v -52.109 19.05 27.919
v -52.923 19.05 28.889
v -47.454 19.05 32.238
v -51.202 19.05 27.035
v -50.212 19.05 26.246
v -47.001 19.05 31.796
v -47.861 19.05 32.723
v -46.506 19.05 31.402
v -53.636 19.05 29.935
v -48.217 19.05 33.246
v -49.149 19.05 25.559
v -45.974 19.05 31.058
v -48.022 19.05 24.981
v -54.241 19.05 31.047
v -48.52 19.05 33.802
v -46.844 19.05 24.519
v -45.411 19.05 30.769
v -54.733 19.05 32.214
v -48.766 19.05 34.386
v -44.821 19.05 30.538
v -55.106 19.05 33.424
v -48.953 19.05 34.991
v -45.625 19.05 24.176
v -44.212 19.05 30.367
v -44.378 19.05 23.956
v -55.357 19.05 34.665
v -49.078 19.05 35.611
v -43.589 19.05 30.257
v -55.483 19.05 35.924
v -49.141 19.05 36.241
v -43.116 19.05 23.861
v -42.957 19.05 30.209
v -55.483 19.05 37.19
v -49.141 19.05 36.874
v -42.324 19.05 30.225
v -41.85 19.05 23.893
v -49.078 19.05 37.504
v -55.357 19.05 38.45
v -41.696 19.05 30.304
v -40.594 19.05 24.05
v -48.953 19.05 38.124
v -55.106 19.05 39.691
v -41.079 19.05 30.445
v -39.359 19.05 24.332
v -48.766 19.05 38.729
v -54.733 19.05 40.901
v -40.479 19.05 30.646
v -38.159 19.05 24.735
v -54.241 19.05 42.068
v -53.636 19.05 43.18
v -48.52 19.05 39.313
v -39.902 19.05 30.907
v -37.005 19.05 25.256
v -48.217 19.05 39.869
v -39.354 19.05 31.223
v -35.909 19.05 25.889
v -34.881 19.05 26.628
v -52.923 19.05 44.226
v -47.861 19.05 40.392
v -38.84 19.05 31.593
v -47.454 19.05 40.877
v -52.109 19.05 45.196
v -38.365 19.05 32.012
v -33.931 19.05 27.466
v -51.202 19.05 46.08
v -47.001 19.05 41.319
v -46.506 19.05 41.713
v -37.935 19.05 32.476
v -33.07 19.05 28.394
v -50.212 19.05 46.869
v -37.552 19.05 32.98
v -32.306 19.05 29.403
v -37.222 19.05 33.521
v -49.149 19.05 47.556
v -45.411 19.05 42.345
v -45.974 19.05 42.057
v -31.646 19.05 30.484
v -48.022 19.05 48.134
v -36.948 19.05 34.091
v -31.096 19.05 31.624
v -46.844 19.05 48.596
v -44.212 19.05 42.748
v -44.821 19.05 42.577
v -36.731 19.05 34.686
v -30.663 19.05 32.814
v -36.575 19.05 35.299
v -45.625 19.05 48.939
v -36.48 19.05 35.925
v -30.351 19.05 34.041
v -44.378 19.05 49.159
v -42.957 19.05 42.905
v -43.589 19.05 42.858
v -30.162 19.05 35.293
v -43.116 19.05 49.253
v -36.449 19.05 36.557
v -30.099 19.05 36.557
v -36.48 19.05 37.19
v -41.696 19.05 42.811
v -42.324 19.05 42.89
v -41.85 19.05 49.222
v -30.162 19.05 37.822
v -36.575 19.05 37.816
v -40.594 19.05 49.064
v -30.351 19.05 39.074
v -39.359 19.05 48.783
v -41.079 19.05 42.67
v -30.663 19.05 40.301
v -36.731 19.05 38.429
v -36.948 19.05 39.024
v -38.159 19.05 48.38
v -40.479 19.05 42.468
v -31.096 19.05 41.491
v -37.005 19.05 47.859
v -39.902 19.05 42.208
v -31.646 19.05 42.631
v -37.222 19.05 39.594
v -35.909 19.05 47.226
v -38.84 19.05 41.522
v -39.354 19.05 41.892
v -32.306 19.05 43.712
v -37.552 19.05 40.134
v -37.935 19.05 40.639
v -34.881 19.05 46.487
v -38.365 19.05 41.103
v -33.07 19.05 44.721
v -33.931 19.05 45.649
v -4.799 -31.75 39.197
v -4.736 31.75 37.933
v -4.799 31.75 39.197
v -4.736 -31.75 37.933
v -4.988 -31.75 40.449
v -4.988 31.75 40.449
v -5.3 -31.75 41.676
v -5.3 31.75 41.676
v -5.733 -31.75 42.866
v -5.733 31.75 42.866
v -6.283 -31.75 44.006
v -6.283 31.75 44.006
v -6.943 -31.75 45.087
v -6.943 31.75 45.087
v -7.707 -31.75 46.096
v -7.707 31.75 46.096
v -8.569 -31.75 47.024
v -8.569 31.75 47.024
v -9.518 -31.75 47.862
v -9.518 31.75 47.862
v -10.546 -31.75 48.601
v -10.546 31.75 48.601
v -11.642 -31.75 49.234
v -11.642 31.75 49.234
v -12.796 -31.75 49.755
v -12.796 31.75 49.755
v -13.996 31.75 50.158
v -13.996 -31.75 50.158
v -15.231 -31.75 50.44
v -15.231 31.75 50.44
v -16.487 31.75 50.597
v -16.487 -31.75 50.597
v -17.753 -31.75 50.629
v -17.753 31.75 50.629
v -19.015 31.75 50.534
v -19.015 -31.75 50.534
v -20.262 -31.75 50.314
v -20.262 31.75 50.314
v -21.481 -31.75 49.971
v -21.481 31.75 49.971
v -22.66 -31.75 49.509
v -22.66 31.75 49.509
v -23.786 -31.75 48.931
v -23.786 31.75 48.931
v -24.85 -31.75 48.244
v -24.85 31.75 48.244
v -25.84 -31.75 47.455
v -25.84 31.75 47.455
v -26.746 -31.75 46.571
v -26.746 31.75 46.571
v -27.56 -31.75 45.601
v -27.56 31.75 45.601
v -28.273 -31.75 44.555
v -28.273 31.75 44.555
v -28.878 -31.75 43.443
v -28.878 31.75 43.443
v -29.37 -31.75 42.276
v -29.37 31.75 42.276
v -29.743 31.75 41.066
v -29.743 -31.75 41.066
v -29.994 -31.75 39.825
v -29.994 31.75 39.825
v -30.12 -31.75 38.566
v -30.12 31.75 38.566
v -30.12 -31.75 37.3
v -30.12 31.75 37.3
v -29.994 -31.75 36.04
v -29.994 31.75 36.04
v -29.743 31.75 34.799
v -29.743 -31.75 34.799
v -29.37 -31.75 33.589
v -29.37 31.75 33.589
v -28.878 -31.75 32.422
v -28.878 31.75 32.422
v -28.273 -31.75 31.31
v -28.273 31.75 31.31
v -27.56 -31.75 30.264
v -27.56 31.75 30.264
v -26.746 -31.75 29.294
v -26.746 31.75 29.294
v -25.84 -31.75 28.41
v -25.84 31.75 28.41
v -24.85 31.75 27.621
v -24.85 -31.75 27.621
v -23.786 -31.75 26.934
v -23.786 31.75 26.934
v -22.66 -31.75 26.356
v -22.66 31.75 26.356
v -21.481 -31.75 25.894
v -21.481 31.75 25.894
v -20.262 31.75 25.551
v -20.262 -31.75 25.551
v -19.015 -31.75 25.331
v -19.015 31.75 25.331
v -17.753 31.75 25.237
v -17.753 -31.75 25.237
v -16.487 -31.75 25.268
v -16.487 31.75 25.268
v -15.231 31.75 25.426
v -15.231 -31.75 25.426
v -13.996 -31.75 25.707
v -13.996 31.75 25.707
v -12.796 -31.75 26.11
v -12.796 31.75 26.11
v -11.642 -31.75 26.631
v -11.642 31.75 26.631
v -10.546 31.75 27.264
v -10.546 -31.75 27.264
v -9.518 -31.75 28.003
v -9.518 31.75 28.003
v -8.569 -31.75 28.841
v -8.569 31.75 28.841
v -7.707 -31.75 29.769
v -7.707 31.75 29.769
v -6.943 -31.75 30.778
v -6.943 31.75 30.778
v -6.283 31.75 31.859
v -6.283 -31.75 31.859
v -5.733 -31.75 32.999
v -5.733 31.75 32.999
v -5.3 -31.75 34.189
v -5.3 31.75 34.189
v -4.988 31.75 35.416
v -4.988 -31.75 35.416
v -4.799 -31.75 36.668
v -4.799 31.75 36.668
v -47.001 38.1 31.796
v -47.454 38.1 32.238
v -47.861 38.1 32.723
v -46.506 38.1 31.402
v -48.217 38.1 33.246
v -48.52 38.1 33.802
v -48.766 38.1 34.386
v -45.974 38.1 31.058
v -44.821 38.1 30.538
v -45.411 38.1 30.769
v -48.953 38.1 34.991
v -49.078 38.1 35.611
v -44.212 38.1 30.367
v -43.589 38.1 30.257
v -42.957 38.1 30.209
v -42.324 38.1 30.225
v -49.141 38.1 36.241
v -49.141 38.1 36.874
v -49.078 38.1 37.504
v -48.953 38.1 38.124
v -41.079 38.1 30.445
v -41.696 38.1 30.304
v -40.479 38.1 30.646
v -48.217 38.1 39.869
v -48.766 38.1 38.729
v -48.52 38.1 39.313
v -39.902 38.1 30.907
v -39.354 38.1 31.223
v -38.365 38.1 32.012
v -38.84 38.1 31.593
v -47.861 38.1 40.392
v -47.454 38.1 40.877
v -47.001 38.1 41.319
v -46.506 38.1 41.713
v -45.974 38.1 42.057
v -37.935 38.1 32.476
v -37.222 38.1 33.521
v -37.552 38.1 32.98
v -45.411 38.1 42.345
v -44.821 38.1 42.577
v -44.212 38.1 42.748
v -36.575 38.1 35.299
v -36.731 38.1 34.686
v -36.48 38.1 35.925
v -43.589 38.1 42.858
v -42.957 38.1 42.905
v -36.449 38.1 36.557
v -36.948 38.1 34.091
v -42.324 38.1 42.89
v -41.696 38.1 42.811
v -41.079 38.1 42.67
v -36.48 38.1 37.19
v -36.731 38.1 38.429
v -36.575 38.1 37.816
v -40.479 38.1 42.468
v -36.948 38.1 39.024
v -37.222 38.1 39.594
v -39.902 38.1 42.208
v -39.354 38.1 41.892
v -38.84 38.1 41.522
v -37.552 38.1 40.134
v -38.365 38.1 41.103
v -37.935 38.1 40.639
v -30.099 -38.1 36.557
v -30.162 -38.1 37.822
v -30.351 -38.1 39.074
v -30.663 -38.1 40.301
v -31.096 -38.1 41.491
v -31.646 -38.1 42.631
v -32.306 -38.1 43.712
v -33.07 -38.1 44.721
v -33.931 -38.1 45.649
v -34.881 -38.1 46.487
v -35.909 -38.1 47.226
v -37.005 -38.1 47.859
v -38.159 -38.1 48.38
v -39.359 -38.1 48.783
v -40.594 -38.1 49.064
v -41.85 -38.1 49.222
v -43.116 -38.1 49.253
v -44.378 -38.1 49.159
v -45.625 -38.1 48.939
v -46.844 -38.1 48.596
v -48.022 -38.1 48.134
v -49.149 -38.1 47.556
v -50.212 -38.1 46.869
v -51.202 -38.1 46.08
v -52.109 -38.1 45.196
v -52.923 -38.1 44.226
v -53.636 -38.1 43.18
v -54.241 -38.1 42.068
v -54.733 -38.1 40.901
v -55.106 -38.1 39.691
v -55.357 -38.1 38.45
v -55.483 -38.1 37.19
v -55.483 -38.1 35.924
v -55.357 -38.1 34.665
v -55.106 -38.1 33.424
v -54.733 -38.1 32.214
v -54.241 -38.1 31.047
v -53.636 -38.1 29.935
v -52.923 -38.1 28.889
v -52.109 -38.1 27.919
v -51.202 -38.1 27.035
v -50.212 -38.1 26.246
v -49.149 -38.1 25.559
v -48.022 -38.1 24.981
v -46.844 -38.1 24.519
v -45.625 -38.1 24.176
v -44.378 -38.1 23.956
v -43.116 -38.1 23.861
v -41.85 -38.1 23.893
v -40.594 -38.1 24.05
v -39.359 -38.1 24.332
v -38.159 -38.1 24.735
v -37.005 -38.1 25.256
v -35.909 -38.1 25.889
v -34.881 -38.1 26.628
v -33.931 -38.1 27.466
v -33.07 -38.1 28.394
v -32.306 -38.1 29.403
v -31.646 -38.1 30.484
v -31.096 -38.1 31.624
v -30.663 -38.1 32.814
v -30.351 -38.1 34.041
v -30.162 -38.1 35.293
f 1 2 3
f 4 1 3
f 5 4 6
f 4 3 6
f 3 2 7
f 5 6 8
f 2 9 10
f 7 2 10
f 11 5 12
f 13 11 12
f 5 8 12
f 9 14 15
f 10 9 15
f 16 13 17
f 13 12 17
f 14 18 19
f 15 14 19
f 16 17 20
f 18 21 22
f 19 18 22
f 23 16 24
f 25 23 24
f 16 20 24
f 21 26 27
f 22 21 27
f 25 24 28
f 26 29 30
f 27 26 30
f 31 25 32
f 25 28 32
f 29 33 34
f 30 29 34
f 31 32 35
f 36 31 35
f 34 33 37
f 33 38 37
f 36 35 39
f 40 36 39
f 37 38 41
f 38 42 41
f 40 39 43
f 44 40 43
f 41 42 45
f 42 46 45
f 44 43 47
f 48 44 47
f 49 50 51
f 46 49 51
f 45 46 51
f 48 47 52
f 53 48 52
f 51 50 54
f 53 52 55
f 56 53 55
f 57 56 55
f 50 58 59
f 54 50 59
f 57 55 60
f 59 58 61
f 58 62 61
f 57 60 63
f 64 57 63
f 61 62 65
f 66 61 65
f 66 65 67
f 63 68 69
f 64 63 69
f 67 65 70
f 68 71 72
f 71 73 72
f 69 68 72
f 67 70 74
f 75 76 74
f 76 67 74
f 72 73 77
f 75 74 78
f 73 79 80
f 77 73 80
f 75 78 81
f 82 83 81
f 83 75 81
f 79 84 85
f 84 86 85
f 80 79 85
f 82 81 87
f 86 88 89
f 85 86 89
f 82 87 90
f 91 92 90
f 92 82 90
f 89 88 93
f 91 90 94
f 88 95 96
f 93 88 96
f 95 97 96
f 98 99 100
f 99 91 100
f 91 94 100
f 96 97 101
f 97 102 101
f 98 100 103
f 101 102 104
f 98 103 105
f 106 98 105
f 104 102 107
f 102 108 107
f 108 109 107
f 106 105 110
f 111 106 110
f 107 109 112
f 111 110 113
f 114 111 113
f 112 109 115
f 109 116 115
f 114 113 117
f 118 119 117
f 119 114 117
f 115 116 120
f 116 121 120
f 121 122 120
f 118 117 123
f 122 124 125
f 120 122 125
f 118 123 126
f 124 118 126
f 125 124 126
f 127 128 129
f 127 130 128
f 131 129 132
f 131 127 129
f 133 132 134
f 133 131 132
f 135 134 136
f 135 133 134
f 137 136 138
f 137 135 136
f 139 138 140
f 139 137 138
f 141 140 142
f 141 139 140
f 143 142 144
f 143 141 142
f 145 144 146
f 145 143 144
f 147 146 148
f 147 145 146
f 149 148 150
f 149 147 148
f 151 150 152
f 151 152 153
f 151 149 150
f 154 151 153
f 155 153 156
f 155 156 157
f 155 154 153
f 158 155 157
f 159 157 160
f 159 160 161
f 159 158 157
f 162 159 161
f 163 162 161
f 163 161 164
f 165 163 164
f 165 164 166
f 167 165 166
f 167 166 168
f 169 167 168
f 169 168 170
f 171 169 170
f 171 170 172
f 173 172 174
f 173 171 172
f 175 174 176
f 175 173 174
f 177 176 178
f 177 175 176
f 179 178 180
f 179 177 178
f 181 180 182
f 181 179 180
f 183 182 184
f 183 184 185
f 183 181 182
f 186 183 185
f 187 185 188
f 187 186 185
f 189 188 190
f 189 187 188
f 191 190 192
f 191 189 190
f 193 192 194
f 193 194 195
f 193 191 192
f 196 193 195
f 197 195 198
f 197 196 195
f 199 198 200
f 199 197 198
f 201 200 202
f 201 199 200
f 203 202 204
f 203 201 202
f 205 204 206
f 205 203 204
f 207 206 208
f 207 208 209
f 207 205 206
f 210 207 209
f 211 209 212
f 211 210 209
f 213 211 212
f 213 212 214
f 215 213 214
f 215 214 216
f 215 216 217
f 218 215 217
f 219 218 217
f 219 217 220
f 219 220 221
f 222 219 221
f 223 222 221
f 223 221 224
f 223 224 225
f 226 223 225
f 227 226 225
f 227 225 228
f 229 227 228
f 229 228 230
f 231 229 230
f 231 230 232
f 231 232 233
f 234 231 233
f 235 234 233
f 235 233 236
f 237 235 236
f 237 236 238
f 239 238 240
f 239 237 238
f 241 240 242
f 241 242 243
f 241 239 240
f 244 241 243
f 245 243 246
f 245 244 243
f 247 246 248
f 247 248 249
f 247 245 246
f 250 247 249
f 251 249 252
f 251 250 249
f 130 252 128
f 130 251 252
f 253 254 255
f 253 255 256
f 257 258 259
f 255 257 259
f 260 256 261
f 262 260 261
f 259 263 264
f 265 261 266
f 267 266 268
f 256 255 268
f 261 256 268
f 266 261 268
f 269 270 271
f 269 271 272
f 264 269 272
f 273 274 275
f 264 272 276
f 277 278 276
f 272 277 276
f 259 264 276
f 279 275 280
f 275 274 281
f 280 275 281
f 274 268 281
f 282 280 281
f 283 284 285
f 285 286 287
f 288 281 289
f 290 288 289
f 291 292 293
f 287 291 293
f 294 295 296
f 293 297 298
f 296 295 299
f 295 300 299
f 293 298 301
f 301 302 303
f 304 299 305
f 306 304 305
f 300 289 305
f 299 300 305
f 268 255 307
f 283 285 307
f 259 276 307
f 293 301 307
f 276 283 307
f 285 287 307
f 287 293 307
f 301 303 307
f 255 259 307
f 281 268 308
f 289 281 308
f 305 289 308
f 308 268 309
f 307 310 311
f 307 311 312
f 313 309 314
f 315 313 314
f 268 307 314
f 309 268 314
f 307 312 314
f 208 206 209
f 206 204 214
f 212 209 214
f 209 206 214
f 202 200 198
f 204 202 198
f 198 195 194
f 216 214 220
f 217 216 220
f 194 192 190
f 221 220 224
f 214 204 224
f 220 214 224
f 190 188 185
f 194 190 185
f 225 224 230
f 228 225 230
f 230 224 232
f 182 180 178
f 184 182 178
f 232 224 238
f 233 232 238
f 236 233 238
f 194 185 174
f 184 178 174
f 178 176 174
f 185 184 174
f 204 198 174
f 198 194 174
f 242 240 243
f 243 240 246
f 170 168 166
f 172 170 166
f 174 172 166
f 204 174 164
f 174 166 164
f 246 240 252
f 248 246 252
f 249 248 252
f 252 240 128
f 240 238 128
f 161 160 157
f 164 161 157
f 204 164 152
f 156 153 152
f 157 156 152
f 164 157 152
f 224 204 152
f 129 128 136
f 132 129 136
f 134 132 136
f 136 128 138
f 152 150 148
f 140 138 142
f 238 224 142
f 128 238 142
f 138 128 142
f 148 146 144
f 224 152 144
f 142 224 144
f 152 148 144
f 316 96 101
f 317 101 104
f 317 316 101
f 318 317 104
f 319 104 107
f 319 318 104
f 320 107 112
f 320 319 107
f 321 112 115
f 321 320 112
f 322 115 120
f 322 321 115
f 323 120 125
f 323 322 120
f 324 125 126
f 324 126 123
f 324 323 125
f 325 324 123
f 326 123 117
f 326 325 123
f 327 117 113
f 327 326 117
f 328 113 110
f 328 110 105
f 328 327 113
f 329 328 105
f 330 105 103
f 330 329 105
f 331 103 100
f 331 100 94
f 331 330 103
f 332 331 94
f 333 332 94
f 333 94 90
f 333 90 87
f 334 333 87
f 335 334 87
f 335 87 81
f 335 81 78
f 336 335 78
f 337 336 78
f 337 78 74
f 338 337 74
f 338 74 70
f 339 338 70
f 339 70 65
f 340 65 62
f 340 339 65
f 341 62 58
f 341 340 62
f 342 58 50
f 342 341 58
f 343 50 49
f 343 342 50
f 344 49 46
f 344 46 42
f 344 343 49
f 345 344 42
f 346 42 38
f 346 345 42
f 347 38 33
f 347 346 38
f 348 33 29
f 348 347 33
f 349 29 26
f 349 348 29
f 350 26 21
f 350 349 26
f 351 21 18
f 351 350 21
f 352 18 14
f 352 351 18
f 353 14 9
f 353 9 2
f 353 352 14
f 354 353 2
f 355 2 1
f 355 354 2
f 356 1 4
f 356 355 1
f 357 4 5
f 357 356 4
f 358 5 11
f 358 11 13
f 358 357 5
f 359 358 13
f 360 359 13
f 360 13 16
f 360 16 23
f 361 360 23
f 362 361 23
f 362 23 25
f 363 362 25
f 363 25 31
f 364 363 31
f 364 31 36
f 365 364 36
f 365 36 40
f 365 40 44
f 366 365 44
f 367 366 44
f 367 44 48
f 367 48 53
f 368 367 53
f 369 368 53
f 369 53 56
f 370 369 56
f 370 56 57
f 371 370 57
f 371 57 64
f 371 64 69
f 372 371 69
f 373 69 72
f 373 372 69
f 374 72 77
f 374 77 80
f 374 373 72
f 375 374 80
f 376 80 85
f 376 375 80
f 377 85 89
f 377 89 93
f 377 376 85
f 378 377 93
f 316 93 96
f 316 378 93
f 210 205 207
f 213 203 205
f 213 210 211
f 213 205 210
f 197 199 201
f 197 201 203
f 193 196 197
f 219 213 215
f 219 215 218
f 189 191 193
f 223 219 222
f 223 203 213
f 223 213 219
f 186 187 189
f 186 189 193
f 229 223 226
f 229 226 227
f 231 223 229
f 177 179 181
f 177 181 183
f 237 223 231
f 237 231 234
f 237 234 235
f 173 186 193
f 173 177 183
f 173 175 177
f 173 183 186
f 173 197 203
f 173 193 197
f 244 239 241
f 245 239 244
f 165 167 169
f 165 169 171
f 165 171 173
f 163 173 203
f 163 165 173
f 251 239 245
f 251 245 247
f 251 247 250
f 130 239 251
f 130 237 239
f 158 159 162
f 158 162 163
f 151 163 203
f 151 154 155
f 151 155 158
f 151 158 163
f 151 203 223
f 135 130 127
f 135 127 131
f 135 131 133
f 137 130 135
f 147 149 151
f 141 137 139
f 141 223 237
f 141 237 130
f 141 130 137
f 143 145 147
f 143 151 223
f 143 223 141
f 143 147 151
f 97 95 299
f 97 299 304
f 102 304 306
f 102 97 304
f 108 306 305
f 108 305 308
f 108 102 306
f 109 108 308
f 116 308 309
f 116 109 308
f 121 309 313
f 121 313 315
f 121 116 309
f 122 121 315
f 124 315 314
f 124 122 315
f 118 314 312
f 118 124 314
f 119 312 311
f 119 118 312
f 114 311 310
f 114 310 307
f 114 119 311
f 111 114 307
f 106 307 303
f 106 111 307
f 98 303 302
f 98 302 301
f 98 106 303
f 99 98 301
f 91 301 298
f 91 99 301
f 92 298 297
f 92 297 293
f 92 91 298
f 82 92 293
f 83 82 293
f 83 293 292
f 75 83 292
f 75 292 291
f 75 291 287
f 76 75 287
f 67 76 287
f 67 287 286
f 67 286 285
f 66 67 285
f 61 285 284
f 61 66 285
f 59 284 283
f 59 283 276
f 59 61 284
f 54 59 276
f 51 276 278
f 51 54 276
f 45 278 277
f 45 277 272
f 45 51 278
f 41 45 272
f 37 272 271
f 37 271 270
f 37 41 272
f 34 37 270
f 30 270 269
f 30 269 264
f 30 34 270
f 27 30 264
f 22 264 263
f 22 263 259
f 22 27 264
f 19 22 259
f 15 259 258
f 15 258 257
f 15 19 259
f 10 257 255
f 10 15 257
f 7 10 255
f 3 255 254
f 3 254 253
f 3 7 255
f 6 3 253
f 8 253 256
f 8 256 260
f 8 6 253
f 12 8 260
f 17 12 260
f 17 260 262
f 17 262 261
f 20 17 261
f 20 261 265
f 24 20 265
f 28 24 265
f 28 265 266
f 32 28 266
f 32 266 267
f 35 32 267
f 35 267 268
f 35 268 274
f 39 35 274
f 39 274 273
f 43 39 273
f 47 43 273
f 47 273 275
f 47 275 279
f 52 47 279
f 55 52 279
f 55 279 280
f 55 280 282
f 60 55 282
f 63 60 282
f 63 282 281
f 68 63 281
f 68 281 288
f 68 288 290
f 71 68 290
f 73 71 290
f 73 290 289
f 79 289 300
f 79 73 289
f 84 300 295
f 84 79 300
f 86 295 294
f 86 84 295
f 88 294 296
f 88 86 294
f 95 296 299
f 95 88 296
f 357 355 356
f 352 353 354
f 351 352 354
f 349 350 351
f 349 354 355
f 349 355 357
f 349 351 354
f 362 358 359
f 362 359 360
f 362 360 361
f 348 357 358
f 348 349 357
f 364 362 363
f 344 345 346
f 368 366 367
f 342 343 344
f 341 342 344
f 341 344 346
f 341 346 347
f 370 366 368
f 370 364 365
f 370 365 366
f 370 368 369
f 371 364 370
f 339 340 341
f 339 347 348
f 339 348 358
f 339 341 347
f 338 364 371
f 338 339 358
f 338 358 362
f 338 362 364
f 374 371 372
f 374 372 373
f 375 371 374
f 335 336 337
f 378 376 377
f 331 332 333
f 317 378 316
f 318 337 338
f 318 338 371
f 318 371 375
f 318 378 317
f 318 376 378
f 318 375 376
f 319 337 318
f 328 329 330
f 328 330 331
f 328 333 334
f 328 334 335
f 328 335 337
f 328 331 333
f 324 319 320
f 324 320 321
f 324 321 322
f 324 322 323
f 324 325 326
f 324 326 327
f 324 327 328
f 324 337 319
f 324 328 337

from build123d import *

# Parameters (mm, degrees)
F0_R     = 6.35
F1_DEPTH = 38.1
F2_R     = 12.7
F3_DEPTH = 57.15
F4_R     = 12.7
F4_R_2   = 6.35
F5_DEPTH = 31.75


with BuildPart() as f1:
    # F0 (on Front) → F1 (new body, symmetric)
    with BuildSketch(Plane.XZ):
        with Locations((-42.798918, 36.557414)):
            Circle(F0_R)
    extrude(amount=F1_DEPTH, both=True)

    # F2 (on face) → F3 (join)
    with BuildSketch(Plane.XZ.offset(38.1)):
        with Locations((-42.798918, 36.557414)):
            Circle(F2_R)
    extrude(amount=-F3_DEPTH)


with BuildPart() as f5:
    # F4 (on Front) → F5 (new body, symmetric)
    with BuildSketch(Plane.XZ):
        with Locations((-17.436172, 37.932592)):
            Circle(F4_R)
        with Locations((-17.436172, 37.932592)):
            Circle(F4_R_2, mode=Mode.SUBTRACT)
        with Locations((-17.436172, 37.932592)):
            Circle(F4_R_2)
    extrude(amount=F5_DEPTH, both=True)


solid = Compound([f1.part, f5.part])
